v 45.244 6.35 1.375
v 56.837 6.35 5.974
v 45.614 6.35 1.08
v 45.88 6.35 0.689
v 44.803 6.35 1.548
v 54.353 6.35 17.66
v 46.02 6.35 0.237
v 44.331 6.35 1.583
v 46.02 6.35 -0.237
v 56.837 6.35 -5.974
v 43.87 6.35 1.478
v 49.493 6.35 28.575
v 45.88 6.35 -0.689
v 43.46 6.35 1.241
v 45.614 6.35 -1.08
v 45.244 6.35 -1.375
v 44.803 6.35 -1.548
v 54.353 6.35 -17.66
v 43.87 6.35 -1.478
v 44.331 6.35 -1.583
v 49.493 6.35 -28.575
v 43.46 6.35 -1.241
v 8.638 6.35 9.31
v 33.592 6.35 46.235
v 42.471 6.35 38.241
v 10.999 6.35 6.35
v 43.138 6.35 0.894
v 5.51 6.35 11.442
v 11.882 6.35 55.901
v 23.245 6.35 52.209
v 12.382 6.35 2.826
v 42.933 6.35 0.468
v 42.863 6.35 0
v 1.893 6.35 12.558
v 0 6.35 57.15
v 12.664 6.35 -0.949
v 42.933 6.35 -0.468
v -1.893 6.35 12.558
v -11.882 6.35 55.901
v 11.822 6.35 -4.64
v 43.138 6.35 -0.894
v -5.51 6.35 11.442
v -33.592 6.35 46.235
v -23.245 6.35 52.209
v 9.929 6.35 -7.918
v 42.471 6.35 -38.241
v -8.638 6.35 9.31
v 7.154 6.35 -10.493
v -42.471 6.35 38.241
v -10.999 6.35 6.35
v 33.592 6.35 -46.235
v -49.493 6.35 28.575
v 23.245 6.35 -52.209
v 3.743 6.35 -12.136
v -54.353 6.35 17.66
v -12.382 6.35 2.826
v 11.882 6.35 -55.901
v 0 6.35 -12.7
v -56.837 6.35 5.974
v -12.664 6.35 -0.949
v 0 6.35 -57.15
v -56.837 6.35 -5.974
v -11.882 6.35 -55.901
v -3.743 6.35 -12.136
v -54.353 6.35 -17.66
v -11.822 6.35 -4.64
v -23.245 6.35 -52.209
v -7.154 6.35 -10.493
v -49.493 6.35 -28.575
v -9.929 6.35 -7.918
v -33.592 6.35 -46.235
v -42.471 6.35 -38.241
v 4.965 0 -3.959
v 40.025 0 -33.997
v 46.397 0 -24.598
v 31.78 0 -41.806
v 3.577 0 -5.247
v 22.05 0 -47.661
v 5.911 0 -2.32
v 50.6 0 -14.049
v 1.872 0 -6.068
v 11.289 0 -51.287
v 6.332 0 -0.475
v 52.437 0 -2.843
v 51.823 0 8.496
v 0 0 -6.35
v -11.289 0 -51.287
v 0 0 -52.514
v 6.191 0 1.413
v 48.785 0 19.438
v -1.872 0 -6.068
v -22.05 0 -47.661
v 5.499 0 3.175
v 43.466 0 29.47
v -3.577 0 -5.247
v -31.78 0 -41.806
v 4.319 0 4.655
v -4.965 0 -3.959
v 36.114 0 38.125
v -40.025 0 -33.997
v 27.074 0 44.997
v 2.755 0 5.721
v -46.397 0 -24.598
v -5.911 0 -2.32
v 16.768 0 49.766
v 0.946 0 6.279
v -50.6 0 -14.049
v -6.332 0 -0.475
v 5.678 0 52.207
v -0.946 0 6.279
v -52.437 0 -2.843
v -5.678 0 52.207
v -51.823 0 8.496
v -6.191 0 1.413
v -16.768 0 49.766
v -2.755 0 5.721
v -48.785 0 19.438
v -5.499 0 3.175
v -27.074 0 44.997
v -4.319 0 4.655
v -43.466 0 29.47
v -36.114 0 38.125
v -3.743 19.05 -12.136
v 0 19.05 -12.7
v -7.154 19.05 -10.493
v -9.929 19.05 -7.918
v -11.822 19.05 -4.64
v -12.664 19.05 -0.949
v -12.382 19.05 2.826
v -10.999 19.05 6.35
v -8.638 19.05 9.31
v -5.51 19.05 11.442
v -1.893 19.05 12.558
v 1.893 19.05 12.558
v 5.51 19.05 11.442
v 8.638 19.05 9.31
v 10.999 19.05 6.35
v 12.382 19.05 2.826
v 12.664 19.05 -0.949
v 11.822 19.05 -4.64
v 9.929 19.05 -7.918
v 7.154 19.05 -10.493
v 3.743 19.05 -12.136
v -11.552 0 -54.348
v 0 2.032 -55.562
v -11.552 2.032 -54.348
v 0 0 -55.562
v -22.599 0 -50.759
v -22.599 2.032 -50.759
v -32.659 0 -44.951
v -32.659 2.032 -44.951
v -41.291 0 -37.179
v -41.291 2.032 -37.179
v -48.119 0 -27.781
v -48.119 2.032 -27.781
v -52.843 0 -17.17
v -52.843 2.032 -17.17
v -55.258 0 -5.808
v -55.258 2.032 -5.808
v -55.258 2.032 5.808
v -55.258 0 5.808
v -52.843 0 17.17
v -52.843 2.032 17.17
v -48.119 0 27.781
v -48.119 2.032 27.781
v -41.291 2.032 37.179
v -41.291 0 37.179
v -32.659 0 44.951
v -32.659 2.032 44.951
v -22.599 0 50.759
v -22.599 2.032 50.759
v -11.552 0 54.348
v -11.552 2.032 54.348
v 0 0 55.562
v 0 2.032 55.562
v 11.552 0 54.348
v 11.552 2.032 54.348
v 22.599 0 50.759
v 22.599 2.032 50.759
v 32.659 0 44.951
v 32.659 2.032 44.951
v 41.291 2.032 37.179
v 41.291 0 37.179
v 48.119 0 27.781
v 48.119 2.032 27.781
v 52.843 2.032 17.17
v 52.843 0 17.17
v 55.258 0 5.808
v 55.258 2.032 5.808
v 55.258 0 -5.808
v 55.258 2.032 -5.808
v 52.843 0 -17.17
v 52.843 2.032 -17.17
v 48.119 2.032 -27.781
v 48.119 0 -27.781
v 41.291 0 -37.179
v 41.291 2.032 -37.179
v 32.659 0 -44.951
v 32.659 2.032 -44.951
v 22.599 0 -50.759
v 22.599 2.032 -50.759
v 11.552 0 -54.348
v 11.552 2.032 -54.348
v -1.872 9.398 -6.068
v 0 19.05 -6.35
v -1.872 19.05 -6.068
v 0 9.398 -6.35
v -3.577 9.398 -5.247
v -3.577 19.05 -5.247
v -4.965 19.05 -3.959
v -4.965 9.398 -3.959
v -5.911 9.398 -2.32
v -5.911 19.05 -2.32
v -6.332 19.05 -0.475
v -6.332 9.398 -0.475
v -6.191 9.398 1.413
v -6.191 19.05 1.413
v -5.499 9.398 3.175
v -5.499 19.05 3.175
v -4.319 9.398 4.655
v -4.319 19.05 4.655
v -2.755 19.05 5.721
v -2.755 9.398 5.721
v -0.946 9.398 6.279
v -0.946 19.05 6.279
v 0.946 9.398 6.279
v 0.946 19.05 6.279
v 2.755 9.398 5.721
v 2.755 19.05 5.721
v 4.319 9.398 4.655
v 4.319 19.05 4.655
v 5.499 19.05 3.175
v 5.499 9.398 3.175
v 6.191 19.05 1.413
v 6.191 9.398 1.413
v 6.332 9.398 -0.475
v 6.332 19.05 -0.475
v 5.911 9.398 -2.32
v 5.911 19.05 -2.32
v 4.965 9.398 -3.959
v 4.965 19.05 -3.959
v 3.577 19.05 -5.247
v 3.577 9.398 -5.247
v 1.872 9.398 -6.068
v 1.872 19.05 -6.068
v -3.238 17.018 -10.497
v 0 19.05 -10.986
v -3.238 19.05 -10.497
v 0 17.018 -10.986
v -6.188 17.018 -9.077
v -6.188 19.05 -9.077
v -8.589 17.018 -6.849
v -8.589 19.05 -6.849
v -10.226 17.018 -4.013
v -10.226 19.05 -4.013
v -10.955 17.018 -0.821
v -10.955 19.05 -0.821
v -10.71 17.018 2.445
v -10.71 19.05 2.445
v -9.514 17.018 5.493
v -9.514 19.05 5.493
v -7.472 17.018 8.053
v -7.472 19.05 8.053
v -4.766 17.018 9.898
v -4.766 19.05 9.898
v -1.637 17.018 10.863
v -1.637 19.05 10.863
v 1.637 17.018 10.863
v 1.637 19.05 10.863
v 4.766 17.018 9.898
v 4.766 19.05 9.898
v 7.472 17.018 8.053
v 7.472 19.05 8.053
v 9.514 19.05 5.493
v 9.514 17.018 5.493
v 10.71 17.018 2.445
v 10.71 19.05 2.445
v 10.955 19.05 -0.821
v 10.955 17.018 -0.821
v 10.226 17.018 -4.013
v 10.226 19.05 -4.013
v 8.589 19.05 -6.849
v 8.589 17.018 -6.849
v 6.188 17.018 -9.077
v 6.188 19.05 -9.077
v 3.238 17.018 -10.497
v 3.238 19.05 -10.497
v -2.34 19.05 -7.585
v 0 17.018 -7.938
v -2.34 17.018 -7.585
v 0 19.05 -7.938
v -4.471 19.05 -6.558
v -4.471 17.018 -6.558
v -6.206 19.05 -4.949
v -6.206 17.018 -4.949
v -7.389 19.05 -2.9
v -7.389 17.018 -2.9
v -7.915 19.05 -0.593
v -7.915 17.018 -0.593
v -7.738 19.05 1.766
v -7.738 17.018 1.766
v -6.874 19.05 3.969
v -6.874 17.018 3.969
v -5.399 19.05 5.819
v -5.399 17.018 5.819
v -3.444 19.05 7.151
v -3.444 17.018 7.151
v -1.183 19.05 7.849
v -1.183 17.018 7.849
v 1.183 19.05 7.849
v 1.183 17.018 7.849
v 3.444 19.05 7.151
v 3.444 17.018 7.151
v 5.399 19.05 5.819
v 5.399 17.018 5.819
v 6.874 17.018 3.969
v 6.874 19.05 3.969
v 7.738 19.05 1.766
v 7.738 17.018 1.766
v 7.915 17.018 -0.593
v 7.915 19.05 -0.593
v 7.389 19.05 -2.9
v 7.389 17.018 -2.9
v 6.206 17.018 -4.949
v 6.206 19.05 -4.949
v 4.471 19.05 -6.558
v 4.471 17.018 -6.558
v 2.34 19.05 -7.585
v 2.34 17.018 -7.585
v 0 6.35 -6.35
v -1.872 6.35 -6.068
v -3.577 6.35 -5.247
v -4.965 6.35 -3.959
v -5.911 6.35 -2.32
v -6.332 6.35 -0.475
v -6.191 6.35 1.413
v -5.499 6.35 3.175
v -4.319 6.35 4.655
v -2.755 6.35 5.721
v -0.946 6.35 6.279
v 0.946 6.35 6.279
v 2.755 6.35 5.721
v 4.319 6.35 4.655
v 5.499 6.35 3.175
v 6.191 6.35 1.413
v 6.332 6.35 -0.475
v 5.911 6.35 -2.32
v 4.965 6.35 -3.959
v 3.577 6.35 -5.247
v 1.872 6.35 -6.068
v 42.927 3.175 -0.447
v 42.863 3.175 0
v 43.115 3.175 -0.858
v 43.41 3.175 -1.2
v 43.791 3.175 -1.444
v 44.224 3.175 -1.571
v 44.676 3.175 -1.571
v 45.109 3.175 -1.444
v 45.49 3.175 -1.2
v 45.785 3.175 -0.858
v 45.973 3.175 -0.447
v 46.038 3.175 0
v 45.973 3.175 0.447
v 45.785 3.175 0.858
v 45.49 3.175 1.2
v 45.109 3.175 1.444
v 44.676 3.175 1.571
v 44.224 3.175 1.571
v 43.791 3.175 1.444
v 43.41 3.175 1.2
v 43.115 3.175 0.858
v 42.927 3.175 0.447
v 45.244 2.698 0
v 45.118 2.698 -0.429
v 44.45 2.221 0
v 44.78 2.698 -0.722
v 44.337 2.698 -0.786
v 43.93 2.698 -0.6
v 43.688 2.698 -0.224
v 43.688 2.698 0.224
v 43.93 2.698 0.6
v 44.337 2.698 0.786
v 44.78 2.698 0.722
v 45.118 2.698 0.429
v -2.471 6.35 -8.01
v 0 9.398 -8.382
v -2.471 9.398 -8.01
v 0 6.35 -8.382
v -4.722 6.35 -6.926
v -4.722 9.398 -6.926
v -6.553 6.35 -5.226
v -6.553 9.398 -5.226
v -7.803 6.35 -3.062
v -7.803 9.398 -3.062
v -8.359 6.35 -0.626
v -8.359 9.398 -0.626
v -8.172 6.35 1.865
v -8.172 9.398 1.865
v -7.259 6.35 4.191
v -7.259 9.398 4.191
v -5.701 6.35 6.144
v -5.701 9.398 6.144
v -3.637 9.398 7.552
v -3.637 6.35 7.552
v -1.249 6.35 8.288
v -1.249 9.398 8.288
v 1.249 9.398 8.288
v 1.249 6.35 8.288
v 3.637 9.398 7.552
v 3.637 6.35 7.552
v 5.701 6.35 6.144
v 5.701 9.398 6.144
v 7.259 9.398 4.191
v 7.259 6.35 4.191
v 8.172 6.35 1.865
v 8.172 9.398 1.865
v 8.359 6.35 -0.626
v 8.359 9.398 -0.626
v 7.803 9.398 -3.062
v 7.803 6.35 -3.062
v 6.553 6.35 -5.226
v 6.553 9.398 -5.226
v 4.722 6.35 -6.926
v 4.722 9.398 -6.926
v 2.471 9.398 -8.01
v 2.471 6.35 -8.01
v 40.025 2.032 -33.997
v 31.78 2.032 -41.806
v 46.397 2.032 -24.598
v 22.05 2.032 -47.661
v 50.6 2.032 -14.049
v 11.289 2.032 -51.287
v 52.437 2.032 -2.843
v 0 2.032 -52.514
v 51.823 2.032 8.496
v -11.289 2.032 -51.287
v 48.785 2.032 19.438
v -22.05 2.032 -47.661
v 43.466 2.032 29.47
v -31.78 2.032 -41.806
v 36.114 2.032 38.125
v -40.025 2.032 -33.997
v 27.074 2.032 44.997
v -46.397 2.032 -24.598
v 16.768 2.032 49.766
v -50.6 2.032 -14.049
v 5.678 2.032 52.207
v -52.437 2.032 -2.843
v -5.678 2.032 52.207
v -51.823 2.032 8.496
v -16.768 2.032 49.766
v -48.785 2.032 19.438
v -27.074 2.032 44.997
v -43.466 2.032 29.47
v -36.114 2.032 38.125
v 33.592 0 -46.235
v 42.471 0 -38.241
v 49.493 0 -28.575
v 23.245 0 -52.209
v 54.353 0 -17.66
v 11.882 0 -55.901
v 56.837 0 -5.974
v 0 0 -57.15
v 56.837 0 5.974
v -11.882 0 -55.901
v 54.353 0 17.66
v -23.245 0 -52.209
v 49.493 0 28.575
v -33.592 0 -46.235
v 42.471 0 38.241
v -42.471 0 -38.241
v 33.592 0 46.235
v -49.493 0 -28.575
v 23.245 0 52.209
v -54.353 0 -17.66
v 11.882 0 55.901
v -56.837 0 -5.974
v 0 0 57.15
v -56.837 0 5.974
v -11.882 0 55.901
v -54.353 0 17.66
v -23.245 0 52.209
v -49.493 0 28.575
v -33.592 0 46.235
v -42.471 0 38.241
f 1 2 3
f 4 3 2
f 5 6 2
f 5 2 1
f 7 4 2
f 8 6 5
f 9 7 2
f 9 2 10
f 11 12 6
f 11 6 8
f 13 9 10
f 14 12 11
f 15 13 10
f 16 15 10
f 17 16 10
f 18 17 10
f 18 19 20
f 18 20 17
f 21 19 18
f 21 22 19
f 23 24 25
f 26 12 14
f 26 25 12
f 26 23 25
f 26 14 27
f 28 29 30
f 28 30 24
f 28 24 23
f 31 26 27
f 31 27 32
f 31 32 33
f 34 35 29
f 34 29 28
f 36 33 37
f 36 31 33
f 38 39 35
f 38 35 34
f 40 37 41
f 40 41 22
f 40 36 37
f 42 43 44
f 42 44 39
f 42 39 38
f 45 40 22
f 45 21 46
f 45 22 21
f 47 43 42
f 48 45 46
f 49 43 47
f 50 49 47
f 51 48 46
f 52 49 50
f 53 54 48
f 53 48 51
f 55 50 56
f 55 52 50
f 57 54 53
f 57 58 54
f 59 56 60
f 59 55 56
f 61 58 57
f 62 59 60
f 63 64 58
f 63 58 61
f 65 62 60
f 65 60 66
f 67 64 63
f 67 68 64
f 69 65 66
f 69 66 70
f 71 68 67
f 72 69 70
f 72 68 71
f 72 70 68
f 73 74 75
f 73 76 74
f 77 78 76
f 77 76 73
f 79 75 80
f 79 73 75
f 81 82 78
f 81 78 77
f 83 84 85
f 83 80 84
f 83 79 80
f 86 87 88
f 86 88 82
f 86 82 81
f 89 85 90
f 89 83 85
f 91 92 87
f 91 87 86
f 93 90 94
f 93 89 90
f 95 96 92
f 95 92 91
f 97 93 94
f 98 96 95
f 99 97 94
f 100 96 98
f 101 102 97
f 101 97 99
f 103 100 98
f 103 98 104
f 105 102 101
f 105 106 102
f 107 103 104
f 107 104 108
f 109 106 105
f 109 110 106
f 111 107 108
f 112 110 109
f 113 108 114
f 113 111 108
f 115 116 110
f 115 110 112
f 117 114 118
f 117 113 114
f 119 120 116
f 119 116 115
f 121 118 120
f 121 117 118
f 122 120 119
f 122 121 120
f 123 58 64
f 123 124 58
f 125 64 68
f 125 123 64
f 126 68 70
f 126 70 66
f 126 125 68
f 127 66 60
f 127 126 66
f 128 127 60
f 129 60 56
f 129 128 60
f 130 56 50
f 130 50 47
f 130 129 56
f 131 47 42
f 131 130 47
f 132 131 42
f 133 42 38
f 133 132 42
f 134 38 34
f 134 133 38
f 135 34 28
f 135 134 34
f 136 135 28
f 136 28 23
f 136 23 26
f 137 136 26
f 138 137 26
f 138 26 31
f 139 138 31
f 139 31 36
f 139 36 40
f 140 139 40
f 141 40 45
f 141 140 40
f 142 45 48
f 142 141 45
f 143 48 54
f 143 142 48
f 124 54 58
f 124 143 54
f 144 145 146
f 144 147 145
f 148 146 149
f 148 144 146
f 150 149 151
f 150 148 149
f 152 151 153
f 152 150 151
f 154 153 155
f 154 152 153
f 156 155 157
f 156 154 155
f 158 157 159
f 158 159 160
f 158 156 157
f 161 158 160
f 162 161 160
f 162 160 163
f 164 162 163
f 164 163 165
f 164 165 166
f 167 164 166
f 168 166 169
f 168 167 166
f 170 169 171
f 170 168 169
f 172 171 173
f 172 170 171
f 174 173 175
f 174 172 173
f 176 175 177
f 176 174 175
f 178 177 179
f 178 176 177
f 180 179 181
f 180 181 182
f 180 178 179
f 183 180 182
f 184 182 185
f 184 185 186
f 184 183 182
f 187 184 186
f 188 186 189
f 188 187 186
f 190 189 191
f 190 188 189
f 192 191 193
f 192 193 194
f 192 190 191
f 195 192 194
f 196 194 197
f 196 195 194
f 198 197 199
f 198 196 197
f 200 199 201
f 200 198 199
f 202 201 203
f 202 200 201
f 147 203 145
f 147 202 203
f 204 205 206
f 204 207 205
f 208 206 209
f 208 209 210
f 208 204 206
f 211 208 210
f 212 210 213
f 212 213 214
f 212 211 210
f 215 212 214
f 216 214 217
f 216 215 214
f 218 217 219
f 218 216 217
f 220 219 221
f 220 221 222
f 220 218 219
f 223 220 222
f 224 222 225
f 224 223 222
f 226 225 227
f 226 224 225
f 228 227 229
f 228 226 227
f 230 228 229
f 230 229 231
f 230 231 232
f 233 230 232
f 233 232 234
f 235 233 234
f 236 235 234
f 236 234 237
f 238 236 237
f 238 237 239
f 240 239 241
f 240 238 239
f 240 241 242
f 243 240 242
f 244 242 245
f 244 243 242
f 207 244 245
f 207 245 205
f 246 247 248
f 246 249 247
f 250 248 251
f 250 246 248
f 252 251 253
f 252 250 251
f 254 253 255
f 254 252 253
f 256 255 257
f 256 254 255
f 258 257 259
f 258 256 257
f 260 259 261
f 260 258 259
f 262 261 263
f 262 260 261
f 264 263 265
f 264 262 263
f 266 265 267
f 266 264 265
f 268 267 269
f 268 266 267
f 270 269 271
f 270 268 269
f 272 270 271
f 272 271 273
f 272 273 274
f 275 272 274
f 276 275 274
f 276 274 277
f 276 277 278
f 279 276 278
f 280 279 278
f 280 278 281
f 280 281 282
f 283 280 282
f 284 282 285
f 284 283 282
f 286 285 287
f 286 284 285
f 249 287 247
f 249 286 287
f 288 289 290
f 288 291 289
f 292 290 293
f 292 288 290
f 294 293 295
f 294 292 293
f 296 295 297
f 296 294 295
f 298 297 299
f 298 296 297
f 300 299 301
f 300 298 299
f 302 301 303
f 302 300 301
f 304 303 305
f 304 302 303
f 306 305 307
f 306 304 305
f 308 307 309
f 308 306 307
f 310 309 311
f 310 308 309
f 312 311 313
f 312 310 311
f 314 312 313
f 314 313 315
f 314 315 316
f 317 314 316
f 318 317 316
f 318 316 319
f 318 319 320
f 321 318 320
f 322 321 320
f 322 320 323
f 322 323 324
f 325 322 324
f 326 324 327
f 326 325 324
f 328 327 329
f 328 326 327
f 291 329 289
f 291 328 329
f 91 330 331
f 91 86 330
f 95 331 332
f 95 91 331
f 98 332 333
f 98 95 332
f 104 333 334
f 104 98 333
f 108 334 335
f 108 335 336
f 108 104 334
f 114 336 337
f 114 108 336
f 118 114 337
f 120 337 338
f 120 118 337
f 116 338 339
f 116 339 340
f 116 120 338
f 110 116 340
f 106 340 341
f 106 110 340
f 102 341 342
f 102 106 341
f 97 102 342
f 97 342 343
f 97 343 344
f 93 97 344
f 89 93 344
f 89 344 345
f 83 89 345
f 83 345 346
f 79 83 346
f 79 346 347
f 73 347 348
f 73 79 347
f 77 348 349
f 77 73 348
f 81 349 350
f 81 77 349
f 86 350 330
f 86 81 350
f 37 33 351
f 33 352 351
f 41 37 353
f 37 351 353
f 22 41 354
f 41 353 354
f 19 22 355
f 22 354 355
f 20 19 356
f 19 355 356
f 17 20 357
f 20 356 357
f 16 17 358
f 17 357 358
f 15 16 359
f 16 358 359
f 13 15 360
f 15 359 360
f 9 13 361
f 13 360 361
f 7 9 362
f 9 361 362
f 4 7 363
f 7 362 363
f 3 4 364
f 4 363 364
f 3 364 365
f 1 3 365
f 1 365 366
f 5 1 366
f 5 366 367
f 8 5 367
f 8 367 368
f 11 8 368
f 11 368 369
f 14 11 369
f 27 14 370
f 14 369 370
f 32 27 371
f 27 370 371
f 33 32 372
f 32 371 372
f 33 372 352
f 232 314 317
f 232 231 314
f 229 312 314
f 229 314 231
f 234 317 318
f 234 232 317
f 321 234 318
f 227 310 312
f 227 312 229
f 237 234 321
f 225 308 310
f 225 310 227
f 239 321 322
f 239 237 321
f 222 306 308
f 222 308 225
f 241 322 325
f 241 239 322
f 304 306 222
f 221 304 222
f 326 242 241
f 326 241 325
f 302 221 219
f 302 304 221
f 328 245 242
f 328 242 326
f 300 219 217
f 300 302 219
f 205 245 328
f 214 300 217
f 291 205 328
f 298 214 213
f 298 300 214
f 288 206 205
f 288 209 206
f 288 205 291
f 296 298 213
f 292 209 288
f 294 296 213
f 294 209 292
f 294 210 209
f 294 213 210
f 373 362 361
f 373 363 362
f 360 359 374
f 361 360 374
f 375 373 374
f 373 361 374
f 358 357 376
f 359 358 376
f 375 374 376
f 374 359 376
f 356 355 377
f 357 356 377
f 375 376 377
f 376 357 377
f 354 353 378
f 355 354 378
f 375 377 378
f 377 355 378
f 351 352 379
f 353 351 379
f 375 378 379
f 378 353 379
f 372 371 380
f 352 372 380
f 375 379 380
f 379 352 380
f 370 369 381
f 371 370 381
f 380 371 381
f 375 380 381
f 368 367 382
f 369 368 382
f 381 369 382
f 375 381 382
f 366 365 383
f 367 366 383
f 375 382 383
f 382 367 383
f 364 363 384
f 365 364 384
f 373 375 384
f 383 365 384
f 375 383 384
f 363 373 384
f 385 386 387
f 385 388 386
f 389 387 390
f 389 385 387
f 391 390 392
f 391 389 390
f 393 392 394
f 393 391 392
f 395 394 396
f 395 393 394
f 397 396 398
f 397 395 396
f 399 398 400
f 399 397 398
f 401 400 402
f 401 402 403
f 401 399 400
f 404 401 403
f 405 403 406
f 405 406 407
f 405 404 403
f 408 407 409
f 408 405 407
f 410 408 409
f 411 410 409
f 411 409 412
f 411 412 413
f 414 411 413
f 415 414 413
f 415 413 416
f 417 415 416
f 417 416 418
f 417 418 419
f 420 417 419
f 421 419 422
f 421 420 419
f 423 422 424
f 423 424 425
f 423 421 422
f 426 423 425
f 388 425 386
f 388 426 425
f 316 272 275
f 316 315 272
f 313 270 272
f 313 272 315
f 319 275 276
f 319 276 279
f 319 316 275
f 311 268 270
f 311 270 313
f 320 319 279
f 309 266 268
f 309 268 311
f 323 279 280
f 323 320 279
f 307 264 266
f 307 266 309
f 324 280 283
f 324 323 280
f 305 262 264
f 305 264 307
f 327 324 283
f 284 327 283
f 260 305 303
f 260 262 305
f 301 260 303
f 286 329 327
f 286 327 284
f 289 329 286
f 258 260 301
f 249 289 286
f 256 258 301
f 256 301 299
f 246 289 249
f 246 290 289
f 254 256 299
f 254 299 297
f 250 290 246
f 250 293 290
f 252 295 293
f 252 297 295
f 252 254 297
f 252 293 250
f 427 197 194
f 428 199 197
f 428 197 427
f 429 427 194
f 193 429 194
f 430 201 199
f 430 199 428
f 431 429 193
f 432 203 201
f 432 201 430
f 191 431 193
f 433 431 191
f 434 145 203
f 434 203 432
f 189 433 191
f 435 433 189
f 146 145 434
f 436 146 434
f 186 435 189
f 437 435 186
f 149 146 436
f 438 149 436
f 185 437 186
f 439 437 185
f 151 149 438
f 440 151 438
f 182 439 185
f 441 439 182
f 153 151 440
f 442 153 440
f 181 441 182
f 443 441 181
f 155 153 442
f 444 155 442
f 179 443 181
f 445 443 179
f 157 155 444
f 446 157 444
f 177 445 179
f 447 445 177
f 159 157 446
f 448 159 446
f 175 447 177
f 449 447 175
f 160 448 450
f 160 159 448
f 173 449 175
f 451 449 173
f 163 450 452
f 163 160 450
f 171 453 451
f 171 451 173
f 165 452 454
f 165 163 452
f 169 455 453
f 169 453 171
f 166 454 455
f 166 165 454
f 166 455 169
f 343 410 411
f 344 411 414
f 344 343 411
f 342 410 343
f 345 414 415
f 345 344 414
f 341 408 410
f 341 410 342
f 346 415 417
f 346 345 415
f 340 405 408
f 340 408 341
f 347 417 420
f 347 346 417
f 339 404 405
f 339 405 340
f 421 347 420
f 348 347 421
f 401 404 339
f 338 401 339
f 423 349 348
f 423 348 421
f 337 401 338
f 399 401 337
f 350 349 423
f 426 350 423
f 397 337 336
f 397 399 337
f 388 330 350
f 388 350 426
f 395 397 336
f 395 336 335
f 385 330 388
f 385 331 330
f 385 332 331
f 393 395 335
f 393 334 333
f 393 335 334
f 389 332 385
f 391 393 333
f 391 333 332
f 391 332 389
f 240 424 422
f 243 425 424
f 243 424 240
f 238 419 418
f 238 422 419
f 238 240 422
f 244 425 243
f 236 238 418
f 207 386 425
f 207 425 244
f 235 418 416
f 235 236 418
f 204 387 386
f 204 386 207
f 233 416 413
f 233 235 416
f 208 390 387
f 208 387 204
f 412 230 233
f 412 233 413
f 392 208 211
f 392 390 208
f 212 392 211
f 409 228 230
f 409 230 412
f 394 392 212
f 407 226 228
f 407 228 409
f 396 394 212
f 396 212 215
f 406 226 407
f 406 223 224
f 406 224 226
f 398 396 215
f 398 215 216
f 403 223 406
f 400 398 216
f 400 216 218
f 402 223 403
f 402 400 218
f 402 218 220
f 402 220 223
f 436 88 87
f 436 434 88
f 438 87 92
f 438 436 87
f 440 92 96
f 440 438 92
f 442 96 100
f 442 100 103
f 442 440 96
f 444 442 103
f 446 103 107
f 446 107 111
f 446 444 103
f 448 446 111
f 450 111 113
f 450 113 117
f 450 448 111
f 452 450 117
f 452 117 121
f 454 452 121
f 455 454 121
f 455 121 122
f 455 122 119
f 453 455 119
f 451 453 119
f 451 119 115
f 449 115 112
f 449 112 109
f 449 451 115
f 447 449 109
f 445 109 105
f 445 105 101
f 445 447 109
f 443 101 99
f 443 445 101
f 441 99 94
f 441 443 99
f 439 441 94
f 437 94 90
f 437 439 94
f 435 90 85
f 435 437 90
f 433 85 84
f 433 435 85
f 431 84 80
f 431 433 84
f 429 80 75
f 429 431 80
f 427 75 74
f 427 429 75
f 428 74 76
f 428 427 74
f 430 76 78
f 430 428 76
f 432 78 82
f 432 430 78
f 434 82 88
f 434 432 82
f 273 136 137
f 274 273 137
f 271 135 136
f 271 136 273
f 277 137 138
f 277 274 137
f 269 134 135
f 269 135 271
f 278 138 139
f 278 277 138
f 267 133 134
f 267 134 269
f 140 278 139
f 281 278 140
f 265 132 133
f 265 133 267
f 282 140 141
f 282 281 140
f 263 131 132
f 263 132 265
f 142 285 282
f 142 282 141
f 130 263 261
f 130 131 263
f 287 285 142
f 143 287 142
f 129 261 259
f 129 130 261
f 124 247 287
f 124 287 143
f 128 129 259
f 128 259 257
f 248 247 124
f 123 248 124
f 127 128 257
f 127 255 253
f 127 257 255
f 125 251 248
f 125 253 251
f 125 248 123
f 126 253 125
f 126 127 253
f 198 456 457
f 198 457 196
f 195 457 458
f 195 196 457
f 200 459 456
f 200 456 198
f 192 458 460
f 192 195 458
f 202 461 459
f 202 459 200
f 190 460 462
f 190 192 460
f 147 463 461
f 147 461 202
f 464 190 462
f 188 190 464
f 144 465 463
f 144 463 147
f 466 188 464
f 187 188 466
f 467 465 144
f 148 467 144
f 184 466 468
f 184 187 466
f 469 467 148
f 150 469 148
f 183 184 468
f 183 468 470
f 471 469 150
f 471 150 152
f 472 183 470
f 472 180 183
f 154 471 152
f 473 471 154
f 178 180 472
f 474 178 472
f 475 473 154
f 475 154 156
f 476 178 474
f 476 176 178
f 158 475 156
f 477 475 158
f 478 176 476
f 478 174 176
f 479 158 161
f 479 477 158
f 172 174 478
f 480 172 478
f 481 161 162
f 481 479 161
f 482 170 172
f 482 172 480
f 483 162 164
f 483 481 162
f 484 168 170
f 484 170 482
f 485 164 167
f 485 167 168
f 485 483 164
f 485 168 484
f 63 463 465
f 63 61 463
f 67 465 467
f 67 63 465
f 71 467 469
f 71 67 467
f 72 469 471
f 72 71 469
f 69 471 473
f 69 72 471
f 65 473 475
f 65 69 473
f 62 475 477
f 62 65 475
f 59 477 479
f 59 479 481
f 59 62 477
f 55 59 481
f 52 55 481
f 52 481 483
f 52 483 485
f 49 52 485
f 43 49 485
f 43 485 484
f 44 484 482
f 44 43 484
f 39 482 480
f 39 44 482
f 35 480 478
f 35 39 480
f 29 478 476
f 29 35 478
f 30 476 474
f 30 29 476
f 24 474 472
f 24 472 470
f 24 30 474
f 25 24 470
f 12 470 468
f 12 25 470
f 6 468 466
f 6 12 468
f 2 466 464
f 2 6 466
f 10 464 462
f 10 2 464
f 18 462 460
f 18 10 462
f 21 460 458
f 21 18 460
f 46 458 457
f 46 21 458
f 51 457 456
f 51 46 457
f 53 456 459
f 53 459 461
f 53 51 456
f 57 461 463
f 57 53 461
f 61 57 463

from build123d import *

# Parameters (mm, degrees)
F_1_8_0_125_DIAMETER_HOLE1_D     = 3.175
F_1_8_0_125_DIAMETER_HOLE1_DEPTH = 3.175
F_1_8_0_125_DIAMETER_HOLE1_TIP   = 0.953866233


with BuildPart() as part:
    # Sketch1 → Revolve1 (revolve)
    with BuildSketch(Plane.XY, mode=Mode.PRIVATE) as revolve1_sk:
        Polygon((-6.35, 0), (-52.5145, 0), (-52.5145, 2.032), (-55.5625, 2.032), (-55.5625, 0), (-57.15, 0), (-57.15, 6.35), (-12.7, 6.35), (-12.7, 19.05), (-10.9855, 19.05), (-10.9855, 17.018), (-7.9375, 17.018), (-7.9375, 19.05), (-6.35, 19.05), (-6.35, 9.398), (-8.382, 9.398), (-8.382, 6.35), (-6.35, 6.35), align=None)
    revolve(revolve1_sk.sketch.rotate(Axis((0, 0, 0), (0, 1, 0)), 270), axis=Axis((0, 0, 0), (0, 1, 0)))

    # 1/8 (0.125) Diameter Hole1
    with Locations(Plane(origin=(0, 6.35, 0), x_dir=(1, 0, 0), z_dir=(0, 1, 0))):
        with Locations((44.45, 0)):
            Hole(F_1_8_0_125_DIAMETER_HOLE1_D / 2, depth=F_1_8_0_125_DIAMETER_HOLE1_DEPTH)
            with Locations((0, 0, -(F_1_8_0_125_DIAMETER_HOLE1_DEPTH + F_1_8_0_125_DIAMETER_HOLE1_TIP / 2))):  # 118° drill point
                Cone(0, F_1_8_0_125_DIAMETER_HOLE1_D / 2, F_1_8_0_125_DIAMETER_HOLE1_TIP, mode=Mode.SUBTRACT)


solid = part.part
